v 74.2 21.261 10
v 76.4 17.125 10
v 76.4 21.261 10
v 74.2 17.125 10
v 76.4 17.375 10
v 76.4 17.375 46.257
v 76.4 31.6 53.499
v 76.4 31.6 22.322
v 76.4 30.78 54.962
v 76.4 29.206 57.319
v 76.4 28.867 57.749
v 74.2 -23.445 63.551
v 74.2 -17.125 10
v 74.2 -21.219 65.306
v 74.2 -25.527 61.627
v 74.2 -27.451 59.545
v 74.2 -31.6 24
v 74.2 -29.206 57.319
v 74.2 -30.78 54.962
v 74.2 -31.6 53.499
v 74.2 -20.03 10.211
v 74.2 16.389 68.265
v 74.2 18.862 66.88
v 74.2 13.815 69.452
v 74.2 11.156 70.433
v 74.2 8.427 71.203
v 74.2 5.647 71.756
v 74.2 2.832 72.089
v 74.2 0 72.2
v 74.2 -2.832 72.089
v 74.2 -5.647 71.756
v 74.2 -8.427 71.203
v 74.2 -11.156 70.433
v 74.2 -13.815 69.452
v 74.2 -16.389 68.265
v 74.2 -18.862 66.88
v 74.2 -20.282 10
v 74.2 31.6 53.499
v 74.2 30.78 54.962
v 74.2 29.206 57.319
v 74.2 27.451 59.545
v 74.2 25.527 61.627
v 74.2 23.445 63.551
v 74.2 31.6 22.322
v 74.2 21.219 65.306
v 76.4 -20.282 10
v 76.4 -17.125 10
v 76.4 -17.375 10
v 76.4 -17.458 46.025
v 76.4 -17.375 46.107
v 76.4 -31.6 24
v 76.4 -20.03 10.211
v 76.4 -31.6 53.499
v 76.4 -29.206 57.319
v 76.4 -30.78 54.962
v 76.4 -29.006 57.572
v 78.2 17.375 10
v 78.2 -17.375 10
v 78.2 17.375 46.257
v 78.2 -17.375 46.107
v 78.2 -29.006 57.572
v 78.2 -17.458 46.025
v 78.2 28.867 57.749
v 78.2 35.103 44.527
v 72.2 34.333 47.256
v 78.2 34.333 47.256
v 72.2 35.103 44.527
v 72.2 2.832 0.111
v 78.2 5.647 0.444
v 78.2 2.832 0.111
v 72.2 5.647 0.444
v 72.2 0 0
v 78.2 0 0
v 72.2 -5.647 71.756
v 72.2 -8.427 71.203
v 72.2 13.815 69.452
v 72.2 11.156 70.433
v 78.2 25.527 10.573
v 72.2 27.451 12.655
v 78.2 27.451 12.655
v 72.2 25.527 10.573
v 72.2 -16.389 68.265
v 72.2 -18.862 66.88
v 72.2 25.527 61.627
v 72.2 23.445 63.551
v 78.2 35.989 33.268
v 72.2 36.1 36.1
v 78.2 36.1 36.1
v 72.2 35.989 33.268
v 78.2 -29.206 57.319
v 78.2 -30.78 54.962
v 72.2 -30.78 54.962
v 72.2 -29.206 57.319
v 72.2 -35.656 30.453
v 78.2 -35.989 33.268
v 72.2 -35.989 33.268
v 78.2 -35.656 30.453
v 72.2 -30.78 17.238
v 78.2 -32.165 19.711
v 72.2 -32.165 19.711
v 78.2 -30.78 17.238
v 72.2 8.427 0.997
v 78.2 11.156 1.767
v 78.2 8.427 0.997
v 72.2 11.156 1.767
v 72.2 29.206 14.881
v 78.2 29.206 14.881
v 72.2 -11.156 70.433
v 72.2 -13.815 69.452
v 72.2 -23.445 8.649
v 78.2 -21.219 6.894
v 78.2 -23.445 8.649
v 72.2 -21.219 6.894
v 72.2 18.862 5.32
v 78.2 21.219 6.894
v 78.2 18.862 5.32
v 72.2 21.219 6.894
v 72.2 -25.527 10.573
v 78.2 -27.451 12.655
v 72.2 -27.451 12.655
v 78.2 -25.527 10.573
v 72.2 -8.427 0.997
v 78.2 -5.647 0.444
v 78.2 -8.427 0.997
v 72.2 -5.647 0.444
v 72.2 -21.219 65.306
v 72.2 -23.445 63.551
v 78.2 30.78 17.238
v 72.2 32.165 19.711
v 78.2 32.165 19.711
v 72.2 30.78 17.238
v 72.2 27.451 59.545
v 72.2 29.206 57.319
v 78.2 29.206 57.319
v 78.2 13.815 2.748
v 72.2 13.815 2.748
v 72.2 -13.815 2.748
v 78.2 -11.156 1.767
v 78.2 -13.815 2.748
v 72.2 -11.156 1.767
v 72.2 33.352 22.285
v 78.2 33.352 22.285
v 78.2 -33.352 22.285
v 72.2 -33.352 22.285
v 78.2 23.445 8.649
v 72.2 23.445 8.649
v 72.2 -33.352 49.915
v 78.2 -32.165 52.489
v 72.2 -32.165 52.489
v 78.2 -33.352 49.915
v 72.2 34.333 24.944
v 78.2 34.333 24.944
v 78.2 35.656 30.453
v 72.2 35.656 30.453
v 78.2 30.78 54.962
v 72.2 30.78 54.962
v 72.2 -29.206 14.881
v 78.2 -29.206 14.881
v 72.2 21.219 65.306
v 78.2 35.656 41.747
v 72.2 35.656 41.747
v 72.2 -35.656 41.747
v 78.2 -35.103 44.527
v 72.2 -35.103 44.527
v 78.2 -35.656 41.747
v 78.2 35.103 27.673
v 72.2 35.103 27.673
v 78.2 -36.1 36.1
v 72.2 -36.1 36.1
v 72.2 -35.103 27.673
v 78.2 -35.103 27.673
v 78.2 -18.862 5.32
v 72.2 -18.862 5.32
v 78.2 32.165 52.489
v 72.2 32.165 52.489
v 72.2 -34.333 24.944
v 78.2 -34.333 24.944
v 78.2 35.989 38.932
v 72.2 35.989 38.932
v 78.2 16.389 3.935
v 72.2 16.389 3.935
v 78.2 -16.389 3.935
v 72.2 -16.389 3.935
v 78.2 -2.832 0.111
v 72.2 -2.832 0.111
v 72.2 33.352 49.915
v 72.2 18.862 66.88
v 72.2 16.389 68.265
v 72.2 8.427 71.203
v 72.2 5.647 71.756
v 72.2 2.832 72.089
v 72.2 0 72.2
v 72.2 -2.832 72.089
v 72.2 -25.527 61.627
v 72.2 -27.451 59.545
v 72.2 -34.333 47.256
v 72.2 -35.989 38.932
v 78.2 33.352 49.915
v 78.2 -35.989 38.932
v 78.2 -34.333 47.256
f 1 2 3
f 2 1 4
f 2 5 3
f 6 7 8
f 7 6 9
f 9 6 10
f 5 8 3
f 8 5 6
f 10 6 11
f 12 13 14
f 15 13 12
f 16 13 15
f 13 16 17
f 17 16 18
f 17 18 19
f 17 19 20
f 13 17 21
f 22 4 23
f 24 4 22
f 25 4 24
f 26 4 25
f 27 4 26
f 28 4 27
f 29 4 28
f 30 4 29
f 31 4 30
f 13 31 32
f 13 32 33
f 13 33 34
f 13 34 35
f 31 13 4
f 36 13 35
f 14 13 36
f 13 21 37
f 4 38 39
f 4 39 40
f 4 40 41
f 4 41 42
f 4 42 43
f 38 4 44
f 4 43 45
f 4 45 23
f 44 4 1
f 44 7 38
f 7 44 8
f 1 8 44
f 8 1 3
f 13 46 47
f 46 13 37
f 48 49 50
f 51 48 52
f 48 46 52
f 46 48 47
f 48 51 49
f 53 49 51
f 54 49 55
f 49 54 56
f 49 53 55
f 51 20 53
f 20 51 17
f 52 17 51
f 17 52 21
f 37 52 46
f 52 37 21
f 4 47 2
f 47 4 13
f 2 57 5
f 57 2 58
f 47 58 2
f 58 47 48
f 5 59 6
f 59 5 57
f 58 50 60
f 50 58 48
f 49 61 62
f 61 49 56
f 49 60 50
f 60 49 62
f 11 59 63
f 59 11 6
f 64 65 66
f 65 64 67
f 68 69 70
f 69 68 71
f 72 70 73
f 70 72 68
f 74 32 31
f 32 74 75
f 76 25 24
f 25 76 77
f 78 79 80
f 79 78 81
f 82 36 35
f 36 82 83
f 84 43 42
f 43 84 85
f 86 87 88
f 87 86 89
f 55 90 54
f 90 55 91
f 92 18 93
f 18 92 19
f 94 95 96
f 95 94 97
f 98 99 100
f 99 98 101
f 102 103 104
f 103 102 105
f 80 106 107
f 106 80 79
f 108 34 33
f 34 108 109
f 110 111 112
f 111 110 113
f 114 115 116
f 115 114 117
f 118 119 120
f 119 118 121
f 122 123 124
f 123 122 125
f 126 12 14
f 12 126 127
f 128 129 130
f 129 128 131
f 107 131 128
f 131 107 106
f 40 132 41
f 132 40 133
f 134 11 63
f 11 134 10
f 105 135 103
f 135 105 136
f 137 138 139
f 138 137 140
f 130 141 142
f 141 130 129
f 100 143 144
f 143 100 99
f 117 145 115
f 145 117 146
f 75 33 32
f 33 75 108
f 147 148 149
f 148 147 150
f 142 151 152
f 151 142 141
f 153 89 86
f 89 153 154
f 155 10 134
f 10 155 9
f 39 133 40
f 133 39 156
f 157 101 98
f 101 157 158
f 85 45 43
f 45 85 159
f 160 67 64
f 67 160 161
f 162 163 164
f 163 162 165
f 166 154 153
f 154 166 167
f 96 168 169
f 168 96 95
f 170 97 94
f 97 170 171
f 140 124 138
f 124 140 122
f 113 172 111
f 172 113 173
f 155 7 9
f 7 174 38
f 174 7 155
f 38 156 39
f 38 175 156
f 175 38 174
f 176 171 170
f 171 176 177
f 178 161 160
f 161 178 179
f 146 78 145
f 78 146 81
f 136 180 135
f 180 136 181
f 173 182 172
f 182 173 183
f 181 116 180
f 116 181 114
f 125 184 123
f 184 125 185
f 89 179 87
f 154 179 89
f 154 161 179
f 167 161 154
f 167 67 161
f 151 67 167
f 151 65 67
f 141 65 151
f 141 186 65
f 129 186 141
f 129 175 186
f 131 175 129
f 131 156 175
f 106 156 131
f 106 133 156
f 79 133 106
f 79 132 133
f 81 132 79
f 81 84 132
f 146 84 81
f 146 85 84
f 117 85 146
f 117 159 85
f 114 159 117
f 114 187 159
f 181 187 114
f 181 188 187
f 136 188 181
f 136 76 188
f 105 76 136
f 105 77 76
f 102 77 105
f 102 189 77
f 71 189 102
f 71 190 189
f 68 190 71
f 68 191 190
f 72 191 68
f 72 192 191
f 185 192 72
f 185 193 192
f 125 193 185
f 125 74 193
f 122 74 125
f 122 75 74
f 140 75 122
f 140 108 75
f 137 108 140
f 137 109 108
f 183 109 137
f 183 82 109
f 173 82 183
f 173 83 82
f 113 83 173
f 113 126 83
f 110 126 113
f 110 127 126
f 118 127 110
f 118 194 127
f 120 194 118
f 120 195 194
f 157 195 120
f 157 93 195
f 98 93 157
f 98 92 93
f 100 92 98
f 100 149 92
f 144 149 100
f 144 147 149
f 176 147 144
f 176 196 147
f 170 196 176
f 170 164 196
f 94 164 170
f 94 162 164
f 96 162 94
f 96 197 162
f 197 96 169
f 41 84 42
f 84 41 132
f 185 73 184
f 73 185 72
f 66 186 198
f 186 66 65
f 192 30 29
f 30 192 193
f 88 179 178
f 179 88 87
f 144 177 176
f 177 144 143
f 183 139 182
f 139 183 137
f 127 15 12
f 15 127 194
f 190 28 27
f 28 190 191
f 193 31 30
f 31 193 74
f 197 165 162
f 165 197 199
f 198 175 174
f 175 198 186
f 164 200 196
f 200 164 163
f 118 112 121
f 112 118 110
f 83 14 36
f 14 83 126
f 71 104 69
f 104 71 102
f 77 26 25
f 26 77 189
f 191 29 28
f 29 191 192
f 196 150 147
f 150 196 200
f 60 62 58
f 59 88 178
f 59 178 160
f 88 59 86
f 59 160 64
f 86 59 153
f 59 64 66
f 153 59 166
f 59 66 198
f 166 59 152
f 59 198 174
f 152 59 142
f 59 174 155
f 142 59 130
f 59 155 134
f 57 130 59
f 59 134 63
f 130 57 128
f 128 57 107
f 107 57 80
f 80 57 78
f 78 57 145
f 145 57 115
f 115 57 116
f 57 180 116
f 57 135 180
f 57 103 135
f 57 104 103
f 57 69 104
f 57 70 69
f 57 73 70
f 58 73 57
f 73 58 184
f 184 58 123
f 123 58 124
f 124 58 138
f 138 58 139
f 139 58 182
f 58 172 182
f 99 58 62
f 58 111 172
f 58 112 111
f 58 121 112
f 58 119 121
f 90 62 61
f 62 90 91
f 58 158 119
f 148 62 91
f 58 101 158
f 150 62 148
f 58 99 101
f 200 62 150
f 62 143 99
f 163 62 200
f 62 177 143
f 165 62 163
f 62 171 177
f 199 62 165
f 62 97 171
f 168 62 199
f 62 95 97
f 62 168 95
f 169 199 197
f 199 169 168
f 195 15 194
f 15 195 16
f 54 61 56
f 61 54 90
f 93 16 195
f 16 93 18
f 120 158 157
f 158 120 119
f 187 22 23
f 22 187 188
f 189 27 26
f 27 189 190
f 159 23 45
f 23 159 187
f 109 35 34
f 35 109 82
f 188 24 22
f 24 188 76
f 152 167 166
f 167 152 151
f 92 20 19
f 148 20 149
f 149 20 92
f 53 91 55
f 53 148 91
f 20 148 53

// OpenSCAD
$fn=80;
handleBodyLen = 62.2;
handleTop = 2.6;
handleMinDia = 17.4;
handleMaxDia = 22.25;
faceDiam = handleBodyLen;
coverDiam = faceDiam + 10;
buffer = .5;

module handle()
{
    union()
    {
        cylinder(handleBodyLen,handleMinDia/2,handleMaxDia/2);
        translate([0,0,handleBodyLen])
        cylinder(handleTop,handleMaxDia/2, handleMaxDia/2*.9);
    }
}

module base()
{
    difference()
    {
        cylinder(2+handleMaxDia+2,faceDiam/2,faceDiam/2);
        union()
        {
            translate([faceDiam/2-handleBodyLen-(faceDiam/2-(faceDiam/4 + 4)-1),0,handleMaxDia/2+2])
                rotate([0,90,0])
                    scale([1.01,1.01,1])
                    handle();
            translate([-faceDiam/4,-faceDiam/2,4])
                cube([faceDiam/2,faceDiam,2+handleMaxDia]);
            translate([faceDiam/4 + 4,-(handleMaxDia + 4)/2,2])
                cube([faceDiam/2,handleMaxDia + 4,2+handleMaxDia+1]);

            translate([-faceDiam/2,(handleMaxDia + 4)/2 + 4,2])
                cube([faceDiam,20,handleMaxDia+3]);
            translate([-faceDiam/2,-((handleMaxDia + 4)/2 + 24),2])
                cube([faceDiam,20,handleMaxDia+3]);


            translate([faceDiam/4 + 4+5.5,0,2+handleMaxDia/2])
                rotate([90,0,0])
                   cylinder(faceDiam, 1.62, 1.62, true);

            translate([-faceDiam*3/8,0,handleMaxDia])
              cylinder(handleMaxDia/2, 1.62, 1.62, true);
        }
    }
}

module cover()
{
    difference()
    {
        union()
        {
            cylinder(6,coverDiam/2,coverDiam/2);
        }
        union()
        {
            baseY = handleMaxDia + 12;
            sliceoutY = faceDiam/2 - baseY/2 + buffer;
        
            translate([-coverDiam/2,-(baseY + buffer)/2,2])
                cube([faceDiam, baseY + buffer, 2+handleMaxDia+1]);

            translate([-coverDiam/2,baseY/2,2])
                difference()
                {
                   cube([faceDiam,sliceoutY,2.2]);
                    translate([faceDiam,sliceoutY/3.5,-0.1])
                    rotate([0,0,50])
                       cube([10,17,5]);
                }
            translate([-coverDiam/2,-(baseY/2+sliceoutY),2])
                difference()
                {
                   cube([faceDiam,sliceoutY,2.2]);
                    translate([faceDiam-14,0,-0.1])
                    rotate([0,0,-50])
                       cube([10,18,5]);
                }
            translate([-coverDiam/3,-(baseY/2+sliceoutY),2])
                    rotate([0,0,45])
                        cube([20,20,5]);
            translate([-coverDiam/3,3,2])
                    rotate([0,0,45])
                        cube([20,20,5]);

        }
    }
}

//base();

translate([faceDiam+10,0,coverDiam/2])
rotate([0,90,0])
cover();
